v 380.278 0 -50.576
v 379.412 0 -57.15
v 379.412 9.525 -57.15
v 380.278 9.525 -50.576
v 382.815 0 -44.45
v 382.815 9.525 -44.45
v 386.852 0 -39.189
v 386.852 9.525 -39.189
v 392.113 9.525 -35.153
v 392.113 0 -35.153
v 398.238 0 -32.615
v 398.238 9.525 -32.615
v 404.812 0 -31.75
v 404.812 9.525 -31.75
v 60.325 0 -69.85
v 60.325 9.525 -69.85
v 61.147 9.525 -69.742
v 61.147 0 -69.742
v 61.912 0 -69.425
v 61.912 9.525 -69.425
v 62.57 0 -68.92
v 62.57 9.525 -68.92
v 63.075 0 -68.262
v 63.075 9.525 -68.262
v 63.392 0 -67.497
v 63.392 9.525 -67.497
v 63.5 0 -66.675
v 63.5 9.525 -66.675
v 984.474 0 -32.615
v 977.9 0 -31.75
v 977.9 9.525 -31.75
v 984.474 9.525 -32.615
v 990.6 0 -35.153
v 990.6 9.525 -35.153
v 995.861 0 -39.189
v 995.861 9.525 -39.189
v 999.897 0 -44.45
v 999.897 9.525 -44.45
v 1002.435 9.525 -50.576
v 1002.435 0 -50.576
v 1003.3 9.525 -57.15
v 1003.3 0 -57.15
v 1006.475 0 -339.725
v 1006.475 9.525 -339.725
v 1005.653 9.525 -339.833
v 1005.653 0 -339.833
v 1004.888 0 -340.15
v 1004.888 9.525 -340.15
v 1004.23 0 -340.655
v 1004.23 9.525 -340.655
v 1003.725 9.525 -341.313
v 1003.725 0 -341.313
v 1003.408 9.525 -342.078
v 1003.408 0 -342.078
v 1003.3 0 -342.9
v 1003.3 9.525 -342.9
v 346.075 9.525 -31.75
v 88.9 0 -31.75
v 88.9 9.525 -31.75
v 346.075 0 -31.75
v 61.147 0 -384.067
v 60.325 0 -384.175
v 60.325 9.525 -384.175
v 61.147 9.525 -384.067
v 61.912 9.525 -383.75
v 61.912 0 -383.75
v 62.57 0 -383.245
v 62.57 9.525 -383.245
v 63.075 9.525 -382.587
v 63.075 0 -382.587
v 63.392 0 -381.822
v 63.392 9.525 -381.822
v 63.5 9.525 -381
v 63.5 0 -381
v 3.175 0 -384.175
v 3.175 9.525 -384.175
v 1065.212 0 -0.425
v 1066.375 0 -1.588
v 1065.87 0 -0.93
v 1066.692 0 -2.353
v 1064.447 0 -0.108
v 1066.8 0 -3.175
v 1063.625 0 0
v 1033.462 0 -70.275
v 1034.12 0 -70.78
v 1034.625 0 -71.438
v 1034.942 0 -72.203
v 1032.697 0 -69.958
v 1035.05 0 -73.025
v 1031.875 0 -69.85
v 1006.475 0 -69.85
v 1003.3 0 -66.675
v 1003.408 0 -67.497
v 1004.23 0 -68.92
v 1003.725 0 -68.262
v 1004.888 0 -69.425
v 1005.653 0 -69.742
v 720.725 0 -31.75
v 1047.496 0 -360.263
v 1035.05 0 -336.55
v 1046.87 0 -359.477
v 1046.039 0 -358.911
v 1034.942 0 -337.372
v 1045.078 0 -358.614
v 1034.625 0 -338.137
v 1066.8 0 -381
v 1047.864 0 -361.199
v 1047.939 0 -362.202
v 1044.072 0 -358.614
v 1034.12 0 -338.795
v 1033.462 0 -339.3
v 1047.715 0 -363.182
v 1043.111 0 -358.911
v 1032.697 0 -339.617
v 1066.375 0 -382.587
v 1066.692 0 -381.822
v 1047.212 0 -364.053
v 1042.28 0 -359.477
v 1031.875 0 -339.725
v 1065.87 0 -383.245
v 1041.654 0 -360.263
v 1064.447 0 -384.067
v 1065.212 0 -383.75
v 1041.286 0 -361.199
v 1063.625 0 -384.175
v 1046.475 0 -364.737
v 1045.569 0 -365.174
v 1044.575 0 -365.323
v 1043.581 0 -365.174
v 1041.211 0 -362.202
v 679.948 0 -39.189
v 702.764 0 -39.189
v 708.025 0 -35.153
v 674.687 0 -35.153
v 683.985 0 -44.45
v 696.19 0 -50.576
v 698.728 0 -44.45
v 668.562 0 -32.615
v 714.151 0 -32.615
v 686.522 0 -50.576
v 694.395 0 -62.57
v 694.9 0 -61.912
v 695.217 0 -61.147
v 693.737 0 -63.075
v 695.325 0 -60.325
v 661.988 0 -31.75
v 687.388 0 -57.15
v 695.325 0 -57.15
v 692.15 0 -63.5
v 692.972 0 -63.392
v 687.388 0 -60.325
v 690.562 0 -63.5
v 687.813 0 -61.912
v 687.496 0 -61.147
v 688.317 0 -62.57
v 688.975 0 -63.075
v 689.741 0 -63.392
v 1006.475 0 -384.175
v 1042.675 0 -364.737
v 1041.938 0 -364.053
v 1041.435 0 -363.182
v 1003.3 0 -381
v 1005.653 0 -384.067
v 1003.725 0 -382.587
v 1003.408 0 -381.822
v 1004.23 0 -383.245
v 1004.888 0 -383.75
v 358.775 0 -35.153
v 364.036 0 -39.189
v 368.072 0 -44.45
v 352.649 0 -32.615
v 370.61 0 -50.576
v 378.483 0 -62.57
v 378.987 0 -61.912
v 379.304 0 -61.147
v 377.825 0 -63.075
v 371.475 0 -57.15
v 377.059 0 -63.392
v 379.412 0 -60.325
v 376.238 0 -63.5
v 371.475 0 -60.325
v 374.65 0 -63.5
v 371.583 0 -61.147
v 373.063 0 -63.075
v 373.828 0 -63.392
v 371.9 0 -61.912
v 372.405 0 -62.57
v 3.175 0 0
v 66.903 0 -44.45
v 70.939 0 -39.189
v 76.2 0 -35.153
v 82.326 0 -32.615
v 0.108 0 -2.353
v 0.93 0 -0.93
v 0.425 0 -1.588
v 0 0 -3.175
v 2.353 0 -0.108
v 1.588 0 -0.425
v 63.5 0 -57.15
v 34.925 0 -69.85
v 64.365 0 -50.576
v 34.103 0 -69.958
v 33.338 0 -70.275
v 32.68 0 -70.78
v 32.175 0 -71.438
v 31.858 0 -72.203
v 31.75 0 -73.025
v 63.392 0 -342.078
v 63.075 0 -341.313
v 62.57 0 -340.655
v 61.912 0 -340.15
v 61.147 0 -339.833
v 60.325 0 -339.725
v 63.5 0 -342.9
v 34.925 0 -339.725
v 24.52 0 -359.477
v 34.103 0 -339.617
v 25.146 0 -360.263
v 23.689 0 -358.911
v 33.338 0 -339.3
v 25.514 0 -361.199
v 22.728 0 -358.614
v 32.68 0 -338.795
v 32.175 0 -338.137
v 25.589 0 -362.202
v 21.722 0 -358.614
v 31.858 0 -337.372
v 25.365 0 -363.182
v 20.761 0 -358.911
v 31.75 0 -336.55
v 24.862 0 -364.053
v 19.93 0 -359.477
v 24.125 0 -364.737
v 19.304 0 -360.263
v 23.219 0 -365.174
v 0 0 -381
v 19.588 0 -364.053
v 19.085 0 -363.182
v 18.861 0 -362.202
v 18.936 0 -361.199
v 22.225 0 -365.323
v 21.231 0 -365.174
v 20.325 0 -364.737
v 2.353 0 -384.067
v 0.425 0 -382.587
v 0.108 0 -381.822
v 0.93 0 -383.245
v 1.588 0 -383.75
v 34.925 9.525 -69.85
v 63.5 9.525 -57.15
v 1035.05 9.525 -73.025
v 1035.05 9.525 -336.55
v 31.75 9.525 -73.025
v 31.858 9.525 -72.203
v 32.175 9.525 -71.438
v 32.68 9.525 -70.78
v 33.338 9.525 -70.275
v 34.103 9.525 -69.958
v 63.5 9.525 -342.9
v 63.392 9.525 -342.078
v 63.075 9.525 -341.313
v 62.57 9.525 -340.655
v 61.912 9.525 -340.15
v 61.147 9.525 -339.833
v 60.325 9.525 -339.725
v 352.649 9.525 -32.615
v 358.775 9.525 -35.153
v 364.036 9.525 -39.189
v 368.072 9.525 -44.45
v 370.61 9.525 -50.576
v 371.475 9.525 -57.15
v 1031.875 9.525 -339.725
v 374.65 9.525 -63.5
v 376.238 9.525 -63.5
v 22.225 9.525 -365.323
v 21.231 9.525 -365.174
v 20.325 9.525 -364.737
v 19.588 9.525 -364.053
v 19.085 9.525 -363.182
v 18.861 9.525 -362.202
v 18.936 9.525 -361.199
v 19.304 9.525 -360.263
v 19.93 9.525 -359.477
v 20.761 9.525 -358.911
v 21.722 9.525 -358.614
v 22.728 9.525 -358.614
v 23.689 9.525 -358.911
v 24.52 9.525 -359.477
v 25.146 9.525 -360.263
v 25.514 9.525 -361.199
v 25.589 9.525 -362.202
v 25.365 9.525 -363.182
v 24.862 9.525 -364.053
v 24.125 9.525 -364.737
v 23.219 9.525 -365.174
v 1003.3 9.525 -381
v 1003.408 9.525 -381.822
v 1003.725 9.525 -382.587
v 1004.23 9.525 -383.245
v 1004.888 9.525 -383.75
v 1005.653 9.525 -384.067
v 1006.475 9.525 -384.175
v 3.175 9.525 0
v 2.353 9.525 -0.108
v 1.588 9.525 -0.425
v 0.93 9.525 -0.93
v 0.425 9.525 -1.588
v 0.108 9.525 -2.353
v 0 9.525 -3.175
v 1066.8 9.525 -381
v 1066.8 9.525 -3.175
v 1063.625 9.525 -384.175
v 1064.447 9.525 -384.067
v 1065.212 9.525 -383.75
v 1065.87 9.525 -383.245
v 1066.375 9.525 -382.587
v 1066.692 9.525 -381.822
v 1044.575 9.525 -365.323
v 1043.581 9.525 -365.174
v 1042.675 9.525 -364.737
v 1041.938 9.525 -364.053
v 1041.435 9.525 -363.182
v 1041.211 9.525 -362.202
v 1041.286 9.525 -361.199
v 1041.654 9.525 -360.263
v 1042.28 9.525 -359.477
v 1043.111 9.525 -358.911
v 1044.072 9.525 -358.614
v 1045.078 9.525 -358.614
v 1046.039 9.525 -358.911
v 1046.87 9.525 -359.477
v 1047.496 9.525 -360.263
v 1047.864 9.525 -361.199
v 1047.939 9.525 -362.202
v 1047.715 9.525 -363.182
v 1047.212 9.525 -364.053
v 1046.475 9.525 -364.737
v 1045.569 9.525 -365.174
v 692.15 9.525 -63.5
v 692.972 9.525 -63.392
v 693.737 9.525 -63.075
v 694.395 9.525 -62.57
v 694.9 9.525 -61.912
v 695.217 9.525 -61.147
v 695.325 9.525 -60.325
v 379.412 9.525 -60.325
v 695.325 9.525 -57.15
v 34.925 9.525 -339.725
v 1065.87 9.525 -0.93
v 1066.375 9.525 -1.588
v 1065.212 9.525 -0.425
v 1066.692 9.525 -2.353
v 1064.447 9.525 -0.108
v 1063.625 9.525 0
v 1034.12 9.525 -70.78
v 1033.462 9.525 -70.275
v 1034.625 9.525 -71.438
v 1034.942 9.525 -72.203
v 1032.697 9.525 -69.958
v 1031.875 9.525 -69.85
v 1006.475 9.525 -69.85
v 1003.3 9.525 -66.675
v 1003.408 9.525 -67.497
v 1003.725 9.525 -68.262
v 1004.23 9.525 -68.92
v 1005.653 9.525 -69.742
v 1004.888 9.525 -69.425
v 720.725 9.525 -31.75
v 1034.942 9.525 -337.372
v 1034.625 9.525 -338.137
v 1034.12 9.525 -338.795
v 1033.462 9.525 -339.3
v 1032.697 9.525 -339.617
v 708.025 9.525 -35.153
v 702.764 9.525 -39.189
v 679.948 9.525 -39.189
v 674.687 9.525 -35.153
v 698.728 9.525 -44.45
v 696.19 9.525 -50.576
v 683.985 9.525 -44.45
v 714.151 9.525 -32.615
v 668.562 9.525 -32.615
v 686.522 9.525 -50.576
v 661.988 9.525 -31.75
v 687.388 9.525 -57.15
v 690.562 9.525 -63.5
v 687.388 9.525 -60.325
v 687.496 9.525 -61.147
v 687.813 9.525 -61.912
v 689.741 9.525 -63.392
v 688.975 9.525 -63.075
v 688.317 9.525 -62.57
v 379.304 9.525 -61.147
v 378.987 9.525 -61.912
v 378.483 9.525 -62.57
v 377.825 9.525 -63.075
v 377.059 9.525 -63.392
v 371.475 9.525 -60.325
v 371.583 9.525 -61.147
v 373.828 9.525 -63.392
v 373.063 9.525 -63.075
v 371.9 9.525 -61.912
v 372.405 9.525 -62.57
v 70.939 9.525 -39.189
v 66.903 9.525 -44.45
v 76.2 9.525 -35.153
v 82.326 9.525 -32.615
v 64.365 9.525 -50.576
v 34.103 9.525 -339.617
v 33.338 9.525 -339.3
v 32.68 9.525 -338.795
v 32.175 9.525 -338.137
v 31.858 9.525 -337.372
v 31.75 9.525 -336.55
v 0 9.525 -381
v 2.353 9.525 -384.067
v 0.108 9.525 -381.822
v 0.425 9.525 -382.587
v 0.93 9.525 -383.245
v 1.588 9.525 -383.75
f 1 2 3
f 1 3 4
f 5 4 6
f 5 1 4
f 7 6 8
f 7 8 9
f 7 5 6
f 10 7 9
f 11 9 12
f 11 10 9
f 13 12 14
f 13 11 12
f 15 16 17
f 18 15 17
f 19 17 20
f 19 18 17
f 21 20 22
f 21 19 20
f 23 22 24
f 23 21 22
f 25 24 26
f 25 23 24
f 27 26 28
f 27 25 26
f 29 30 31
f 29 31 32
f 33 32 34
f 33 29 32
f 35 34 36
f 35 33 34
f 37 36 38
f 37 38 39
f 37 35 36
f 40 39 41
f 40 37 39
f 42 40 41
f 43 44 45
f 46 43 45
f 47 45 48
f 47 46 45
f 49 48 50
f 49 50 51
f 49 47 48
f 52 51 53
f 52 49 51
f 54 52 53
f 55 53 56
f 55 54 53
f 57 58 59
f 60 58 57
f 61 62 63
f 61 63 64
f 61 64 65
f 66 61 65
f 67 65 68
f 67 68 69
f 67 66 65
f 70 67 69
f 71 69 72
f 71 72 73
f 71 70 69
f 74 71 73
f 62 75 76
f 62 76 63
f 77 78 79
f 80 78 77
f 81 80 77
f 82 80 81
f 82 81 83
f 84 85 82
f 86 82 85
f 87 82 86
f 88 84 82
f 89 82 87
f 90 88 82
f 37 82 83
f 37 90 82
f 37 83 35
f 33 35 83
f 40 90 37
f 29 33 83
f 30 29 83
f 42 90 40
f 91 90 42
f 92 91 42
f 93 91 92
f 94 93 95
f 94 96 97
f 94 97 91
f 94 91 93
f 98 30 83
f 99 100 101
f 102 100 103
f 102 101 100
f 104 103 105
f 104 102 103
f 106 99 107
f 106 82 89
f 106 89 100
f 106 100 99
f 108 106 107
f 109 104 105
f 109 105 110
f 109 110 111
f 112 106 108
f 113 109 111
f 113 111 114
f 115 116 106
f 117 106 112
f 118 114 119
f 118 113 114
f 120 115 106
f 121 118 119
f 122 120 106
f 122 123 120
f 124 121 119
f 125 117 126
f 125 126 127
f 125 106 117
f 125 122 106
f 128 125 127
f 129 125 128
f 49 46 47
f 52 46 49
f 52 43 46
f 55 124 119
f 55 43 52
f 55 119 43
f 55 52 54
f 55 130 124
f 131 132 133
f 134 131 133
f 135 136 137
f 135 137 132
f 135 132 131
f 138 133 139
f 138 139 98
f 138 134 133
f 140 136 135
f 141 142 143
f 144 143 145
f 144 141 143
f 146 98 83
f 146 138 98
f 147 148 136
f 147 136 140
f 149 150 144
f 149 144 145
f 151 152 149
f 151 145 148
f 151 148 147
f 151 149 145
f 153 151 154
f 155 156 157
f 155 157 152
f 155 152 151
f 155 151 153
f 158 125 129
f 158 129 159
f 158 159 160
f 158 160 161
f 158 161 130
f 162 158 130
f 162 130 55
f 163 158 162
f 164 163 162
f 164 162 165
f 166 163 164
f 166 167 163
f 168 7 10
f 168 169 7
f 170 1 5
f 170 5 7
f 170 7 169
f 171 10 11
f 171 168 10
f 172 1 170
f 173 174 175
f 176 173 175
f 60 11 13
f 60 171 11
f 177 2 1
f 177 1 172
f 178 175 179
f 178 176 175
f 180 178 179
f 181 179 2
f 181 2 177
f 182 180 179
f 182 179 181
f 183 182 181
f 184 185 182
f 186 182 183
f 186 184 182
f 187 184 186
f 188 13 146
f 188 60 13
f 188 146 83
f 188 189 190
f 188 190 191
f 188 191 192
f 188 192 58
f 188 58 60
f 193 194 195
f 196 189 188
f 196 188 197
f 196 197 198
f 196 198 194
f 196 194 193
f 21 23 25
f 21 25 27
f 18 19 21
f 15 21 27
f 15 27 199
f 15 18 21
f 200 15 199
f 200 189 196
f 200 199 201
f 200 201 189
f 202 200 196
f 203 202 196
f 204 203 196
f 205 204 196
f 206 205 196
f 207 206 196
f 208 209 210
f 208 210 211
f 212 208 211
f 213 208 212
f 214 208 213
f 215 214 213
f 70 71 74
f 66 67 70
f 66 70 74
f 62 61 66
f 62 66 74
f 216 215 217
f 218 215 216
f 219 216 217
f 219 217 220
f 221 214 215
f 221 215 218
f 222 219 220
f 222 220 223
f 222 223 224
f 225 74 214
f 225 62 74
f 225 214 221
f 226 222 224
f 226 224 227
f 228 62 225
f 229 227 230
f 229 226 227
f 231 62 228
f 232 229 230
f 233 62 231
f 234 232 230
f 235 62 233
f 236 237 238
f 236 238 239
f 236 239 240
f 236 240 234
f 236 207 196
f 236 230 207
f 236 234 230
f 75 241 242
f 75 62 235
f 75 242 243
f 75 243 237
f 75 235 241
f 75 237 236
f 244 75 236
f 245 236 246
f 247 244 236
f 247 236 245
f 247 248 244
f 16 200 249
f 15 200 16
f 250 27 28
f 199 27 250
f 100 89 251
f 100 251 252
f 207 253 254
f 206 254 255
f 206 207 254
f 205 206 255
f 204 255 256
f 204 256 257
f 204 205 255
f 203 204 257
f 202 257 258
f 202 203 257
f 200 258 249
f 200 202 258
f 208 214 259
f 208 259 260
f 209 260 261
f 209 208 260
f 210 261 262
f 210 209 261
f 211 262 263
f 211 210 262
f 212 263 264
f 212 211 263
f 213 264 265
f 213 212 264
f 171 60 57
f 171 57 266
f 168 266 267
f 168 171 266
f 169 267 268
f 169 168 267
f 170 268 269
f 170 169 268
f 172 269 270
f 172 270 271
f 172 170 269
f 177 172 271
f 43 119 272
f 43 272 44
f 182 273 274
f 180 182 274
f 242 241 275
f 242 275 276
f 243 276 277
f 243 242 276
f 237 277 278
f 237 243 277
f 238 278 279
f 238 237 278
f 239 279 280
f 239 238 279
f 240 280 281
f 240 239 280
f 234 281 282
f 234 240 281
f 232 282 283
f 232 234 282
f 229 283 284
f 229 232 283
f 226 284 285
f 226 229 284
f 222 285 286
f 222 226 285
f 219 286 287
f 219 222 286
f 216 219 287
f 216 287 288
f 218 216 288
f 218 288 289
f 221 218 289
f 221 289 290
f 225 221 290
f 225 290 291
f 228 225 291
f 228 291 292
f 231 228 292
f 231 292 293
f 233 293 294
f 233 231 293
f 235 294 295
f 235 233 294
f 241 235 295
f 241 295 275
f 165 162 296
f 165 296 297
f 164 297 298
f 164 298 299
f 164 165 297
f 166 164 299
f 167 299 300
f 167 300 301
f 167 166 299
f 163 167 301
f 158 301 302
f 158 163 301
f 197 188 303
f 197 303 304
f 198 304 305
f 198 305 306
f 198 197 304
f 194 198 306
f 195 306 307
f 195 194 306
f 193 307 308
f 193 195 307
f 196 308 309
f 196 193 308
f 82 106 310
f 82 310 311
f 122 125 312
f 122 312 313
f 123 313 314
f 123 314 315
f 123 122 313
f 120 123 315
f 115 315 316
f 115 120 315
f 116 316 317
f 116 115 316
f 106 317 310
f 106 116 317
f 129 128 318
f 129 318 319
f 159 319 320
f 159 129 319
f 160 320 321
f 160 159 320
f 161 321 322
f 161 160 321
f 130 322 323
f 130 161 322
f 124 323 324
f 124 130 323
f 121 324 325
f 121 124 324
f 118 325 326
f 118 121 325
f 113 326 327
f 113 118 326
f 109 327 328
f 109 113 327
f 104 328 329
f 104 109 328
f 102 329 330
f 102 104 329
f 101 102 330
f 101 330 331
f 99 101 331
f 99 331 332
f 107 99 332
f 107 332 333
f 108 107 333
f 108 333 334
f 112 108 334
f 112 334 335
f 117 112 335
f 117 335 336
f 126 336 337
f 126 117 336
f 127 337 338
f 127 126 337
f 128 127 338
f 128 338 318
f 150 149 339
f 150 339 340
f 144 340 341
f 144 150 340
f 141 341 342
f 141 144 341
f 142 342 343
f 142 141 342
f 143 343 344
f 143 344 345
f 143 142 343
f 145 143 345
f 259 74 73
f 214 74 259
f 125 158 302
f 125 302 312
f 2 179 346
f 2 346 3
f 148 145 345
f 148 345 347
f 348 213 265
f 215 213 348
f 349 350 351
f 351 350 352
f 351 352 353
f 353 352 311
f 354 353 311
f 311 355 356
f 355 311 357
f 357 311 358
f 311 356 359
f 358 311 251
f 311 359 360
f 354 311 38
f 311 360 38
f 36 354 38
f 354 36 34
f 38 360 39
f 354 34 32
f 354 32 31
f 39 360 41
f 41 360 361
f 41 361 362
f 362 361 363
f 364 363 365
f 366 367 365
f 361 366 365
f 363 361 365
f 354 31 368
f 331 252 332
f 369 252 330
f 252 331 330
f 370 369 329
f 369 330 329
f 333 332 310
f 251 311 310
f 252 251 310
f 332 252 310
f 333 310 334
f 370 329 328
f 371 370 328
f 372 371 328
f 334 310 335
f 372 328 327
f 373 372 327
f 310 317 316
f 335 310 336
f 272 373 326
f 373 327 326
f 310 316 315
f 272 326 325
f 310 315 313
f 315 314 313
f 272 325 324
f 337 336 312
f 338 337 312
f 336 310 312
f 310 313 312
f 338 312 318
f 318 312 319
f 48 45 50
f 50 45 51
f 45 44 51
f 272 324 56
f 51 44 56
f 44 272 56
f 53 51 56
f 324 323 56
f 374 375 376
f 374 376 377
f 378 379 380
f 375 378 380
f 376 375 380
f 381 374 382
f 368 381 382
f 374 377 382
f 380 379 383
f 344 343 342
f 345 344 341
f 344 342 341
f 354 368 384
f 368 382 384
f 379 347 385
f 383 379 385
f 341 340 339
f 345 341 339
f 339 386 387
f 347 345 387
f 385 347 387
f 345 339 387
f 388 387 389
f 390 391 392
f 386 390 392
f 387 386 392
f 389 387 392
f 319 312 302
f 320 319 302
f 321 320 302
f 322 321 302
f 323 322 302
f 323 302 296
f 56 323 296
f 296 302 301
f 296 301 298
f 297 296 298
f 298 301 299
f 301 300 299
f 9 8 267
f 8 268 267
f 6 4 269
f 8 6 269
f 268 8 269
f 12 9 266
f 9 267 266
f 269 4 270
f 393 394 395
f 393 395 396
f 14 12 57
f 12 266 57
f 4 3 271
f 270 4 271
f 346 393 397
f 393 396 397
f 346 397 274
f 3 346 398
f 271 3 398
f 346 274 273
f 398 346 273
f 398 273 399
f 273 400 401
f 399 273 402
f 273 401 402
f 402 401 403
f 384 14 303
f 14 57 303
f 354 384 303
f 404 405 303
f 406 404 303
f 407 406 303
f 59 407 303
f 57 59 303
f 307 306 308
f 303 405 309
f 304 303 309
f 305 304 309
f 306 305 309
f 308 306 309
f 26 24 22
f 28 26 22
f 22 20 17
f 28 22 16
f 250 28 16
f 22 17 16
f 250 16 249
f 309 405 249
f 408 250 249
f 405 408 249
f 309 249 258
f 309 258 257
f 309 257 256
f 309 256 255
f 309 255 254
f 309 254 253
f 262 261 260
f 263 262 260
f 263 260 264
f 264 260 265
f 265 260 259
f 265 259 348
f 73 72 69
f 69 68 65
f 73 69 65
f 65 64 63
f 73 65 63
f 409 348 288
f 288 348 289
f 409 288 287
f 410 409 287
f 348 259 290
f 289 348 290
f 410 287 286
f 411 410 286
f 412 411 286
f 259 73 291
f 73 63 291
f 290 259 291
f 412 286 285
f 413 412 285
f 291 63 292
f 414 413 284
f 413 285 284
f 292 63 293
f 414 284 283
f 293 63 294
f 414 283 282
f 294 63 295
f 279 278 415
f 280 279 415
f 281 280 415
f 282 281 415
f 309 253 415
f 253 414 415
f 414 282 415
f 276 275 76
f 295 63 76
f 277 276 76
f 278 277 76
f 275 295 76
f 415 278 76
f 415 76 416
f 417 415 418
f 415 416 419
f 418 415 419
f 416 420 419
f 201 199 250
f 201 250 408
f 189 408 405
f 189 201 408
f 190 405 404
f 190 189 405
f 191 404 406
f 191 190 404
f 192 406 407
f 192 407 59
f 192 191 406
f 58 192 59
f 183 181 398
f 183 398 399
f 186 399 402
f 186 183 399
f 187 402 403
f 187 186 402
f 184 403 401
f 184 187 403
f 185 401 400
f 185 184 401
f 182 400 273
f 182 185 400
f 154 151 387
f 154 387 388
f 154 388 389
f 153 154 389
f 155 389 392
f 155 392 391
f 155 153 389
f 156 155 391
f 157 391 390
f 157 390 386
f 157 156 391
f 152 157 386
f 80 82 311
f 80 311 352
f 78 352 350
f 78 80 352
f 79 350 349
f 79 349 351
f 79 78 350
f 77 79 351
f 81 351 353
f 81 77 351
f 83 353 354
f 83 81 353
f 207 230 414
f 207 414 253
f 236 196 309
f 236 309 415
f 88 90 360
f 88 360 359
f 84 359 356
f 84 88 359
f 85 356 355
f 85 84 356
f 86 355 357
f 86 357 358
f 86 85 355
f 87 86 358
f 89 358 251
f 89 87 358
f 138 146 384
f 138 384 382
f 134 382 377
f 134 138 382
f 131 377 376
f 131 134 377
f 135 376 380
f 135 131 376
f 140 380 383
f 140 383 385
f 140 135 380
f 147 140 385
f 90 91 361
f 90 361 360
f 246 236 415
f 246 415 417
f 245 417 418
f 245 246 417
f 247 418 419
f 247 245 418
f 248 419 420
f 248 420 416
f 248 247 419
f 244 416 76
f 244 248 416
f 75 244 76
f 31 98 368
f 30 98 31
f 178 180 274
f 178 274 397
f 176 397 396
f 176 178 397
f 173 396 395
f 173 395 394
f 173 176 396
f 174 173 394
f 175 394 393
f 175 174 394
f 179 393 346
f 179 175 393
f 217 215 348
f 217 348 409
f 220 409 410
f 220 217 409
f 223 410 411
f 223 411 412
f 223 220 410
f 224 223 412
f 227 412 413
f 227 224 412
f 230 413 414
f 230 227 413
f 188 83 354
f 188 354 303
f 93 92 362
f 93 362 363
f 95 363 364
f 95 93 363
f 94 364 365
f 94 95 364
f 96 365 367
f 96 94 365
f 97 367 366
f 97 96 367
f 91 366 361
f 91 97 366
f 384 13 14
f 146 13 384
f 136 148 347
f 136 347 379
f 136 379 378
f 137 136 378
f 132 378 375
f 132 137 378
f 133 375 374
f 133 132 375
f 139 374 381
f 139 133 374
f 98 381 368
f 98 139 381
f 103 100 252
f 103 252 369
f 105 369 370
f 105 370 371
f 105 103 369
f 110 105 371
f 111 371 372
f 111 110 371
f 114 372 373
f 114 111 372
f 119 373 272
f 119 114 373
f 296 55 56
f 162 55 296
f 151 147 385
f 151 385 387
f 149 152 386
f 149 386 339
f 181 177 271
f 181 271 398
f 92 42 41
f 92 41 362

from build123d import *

# Parameters (mm, degrees)
SKETCH1_R           = 3.3734375
BOSS_EXTRUDE1_DEPTH = 9.525


with BuildPart() as part:
    # Sketch1 → Boss-Extrude1 (new body)
    with BuildSketch(Plane(origin=(0, 0, 0), x_dir=(1, 0, 0), z_dir=(0, 1, 0))):
        with BuildLine():
            Line((1006.475, 384.175), (1063.625, 384.175))
            ThreePointArc((1063.625, 384.175), (1065.87006403, 383.24506403), (1066.8, 381))
            Line((1066.8, 381), (1066.8, 3.175))
            ThreePointArc((1066.8, 3.175), (1065.87006403, 0.92993597), (1063.625, 0))
            Line((1063.625, 0), (3.175, 0))
            ThreePointArc((3.175, 0), (0.92993597, 0.92993597), (0, 3.175))
            Line((0, 3.175), (0, 381))
            ThreePointArc((0, 381), (0.92993597, 383.24506403), (3.175, 384.175))
            Line((3.175, 384.175), (60.325, 384.175))
            ThreePointArc((60.325, 384.175), (62.57006403, 383.24506403), (63.5, 381))
            Line((63.5, 381), (63.5, 342.9))
            ThreePointArc((63.5, 342.9), (62.57006403, 340.65493597), (60.325, 339.725))
            Line((60.325, 339.725), (34.925, 339.725))
            ThreePointArc((34.925, 339.725), (32.67993597, 338.79506403), (31.75, 336.55))
            Line((31.75, 336.55), (31.75, 73.025))
            ThreePointArc((31.75, 73.025), (32.67993597, 70.77993597), (34.925, 69.85))
            Line((34.925, 69.85), (60.325, 69.85))
            ThreePointArc((60.325, 69.85), (62.57006403, 68.92006403), (63.5, 66.675))
            Line((63.5, 66.675), (63.5, 57.15))
            ThreePointArc((63.5, 57.15), (70.939487758, 39.189487758), (88.9, 31.75))
            Line((88.9, 31.75), (346.075, 31.75))
            ThreePointArc((346.075, 31.75), (364.035512242, 39.189487758), (371.475, 57.15))
            Line((371.475, 57.15), (371.475, 60.325))
            ThreePointArc((371.475, 60.325), (372.40493597, 62.57006403), (374.65, 63.5))
            Line((374.65, 63.5), (376.2375, 63.5))
            ThreePointArc((376.2375, 63.5), (378.48256403, 62.57006403), (379.4125, 60.325))
            Line((379.4125, 60.325), (379.4125, 57.15))
            ThreePointArc((379.4125, 57.15), (386.851987758, 39.189487758), (404.8125, 31.75))
            Line((404.8125, 31.75), (661.9875, 31.75))
            ThreePointArc((661.9875, 31.75), (679.948012242, 39.189487758), (687.3875, 57.15))
            Line((687.3875, 57.15), (687.3875, 60.325))
            ThreePointArc((687.3875, 60.325), (688.31743597, 62.57006403), (690.5625, 63.5))
            Line((690.5625, 63.5), (692.15, 63.5))
            ThreePointArc((692.15, 63.5), (694.39506403, 62.57006403), (695.325, 60.325))
            Line((695.325, 60.325), (695.325, 57.15))
            ThreePointArc((695.325, 57.15), (702.764487758, 39.189487758), (720.725, 31.75))
            Line((720.725, 31.75), (977.9, 31.75))
            ThreePointArc((977.9, 31.75), (995.860512242, 39.189487758), (1003.3, 57.15))
            Line((1003.3, 57.15), (1003.3, 66.675))
            ThreePointArc((1003.3, 66.675), (1004.22993597, 68.92006403), (1006.475, 69.85))
            Line((1006.475, 69.85), (1031.875, 69.85))
            ThreePointArc((1031.875, 69.85), (1034.12006403, 70.77993597), (1035.05, 73.025))
            Line((1035.05, 73.025), (1035.05, 336.55))
            ThreePointArc((1035.05, 336.55), (1034.12006403, 338.79506403), (1031.875, 339.725))
            Line((1031.875, 339.725), (1006.475, 339.725))
            ThreePointArc((1006.475, 339.725), (1004.22993597, 340.65493597), (1003.3, 342.9))
            Line((1003.3, 342.9), (1003.3, 381))
            ThreePointArc((1003.3, 381), (1004.22993597, 383.24506403), (1006.475, 384.175))
        make_face()
        with Locations(Location((22.225, 361.95, 0), (0, 0, 90))):
            Circle(SKETCH1_R, mode=Mode.SUBTRACT)
        with Locations(Location((1044.575, 361.95, 0), (0, 0, 90))):
            Circle(SKETCH1_R, mode=Mode.SUBTRACT)
    extrude(amount=BOSS_EXTRUDE1_DEPTH)


solid = part.part
